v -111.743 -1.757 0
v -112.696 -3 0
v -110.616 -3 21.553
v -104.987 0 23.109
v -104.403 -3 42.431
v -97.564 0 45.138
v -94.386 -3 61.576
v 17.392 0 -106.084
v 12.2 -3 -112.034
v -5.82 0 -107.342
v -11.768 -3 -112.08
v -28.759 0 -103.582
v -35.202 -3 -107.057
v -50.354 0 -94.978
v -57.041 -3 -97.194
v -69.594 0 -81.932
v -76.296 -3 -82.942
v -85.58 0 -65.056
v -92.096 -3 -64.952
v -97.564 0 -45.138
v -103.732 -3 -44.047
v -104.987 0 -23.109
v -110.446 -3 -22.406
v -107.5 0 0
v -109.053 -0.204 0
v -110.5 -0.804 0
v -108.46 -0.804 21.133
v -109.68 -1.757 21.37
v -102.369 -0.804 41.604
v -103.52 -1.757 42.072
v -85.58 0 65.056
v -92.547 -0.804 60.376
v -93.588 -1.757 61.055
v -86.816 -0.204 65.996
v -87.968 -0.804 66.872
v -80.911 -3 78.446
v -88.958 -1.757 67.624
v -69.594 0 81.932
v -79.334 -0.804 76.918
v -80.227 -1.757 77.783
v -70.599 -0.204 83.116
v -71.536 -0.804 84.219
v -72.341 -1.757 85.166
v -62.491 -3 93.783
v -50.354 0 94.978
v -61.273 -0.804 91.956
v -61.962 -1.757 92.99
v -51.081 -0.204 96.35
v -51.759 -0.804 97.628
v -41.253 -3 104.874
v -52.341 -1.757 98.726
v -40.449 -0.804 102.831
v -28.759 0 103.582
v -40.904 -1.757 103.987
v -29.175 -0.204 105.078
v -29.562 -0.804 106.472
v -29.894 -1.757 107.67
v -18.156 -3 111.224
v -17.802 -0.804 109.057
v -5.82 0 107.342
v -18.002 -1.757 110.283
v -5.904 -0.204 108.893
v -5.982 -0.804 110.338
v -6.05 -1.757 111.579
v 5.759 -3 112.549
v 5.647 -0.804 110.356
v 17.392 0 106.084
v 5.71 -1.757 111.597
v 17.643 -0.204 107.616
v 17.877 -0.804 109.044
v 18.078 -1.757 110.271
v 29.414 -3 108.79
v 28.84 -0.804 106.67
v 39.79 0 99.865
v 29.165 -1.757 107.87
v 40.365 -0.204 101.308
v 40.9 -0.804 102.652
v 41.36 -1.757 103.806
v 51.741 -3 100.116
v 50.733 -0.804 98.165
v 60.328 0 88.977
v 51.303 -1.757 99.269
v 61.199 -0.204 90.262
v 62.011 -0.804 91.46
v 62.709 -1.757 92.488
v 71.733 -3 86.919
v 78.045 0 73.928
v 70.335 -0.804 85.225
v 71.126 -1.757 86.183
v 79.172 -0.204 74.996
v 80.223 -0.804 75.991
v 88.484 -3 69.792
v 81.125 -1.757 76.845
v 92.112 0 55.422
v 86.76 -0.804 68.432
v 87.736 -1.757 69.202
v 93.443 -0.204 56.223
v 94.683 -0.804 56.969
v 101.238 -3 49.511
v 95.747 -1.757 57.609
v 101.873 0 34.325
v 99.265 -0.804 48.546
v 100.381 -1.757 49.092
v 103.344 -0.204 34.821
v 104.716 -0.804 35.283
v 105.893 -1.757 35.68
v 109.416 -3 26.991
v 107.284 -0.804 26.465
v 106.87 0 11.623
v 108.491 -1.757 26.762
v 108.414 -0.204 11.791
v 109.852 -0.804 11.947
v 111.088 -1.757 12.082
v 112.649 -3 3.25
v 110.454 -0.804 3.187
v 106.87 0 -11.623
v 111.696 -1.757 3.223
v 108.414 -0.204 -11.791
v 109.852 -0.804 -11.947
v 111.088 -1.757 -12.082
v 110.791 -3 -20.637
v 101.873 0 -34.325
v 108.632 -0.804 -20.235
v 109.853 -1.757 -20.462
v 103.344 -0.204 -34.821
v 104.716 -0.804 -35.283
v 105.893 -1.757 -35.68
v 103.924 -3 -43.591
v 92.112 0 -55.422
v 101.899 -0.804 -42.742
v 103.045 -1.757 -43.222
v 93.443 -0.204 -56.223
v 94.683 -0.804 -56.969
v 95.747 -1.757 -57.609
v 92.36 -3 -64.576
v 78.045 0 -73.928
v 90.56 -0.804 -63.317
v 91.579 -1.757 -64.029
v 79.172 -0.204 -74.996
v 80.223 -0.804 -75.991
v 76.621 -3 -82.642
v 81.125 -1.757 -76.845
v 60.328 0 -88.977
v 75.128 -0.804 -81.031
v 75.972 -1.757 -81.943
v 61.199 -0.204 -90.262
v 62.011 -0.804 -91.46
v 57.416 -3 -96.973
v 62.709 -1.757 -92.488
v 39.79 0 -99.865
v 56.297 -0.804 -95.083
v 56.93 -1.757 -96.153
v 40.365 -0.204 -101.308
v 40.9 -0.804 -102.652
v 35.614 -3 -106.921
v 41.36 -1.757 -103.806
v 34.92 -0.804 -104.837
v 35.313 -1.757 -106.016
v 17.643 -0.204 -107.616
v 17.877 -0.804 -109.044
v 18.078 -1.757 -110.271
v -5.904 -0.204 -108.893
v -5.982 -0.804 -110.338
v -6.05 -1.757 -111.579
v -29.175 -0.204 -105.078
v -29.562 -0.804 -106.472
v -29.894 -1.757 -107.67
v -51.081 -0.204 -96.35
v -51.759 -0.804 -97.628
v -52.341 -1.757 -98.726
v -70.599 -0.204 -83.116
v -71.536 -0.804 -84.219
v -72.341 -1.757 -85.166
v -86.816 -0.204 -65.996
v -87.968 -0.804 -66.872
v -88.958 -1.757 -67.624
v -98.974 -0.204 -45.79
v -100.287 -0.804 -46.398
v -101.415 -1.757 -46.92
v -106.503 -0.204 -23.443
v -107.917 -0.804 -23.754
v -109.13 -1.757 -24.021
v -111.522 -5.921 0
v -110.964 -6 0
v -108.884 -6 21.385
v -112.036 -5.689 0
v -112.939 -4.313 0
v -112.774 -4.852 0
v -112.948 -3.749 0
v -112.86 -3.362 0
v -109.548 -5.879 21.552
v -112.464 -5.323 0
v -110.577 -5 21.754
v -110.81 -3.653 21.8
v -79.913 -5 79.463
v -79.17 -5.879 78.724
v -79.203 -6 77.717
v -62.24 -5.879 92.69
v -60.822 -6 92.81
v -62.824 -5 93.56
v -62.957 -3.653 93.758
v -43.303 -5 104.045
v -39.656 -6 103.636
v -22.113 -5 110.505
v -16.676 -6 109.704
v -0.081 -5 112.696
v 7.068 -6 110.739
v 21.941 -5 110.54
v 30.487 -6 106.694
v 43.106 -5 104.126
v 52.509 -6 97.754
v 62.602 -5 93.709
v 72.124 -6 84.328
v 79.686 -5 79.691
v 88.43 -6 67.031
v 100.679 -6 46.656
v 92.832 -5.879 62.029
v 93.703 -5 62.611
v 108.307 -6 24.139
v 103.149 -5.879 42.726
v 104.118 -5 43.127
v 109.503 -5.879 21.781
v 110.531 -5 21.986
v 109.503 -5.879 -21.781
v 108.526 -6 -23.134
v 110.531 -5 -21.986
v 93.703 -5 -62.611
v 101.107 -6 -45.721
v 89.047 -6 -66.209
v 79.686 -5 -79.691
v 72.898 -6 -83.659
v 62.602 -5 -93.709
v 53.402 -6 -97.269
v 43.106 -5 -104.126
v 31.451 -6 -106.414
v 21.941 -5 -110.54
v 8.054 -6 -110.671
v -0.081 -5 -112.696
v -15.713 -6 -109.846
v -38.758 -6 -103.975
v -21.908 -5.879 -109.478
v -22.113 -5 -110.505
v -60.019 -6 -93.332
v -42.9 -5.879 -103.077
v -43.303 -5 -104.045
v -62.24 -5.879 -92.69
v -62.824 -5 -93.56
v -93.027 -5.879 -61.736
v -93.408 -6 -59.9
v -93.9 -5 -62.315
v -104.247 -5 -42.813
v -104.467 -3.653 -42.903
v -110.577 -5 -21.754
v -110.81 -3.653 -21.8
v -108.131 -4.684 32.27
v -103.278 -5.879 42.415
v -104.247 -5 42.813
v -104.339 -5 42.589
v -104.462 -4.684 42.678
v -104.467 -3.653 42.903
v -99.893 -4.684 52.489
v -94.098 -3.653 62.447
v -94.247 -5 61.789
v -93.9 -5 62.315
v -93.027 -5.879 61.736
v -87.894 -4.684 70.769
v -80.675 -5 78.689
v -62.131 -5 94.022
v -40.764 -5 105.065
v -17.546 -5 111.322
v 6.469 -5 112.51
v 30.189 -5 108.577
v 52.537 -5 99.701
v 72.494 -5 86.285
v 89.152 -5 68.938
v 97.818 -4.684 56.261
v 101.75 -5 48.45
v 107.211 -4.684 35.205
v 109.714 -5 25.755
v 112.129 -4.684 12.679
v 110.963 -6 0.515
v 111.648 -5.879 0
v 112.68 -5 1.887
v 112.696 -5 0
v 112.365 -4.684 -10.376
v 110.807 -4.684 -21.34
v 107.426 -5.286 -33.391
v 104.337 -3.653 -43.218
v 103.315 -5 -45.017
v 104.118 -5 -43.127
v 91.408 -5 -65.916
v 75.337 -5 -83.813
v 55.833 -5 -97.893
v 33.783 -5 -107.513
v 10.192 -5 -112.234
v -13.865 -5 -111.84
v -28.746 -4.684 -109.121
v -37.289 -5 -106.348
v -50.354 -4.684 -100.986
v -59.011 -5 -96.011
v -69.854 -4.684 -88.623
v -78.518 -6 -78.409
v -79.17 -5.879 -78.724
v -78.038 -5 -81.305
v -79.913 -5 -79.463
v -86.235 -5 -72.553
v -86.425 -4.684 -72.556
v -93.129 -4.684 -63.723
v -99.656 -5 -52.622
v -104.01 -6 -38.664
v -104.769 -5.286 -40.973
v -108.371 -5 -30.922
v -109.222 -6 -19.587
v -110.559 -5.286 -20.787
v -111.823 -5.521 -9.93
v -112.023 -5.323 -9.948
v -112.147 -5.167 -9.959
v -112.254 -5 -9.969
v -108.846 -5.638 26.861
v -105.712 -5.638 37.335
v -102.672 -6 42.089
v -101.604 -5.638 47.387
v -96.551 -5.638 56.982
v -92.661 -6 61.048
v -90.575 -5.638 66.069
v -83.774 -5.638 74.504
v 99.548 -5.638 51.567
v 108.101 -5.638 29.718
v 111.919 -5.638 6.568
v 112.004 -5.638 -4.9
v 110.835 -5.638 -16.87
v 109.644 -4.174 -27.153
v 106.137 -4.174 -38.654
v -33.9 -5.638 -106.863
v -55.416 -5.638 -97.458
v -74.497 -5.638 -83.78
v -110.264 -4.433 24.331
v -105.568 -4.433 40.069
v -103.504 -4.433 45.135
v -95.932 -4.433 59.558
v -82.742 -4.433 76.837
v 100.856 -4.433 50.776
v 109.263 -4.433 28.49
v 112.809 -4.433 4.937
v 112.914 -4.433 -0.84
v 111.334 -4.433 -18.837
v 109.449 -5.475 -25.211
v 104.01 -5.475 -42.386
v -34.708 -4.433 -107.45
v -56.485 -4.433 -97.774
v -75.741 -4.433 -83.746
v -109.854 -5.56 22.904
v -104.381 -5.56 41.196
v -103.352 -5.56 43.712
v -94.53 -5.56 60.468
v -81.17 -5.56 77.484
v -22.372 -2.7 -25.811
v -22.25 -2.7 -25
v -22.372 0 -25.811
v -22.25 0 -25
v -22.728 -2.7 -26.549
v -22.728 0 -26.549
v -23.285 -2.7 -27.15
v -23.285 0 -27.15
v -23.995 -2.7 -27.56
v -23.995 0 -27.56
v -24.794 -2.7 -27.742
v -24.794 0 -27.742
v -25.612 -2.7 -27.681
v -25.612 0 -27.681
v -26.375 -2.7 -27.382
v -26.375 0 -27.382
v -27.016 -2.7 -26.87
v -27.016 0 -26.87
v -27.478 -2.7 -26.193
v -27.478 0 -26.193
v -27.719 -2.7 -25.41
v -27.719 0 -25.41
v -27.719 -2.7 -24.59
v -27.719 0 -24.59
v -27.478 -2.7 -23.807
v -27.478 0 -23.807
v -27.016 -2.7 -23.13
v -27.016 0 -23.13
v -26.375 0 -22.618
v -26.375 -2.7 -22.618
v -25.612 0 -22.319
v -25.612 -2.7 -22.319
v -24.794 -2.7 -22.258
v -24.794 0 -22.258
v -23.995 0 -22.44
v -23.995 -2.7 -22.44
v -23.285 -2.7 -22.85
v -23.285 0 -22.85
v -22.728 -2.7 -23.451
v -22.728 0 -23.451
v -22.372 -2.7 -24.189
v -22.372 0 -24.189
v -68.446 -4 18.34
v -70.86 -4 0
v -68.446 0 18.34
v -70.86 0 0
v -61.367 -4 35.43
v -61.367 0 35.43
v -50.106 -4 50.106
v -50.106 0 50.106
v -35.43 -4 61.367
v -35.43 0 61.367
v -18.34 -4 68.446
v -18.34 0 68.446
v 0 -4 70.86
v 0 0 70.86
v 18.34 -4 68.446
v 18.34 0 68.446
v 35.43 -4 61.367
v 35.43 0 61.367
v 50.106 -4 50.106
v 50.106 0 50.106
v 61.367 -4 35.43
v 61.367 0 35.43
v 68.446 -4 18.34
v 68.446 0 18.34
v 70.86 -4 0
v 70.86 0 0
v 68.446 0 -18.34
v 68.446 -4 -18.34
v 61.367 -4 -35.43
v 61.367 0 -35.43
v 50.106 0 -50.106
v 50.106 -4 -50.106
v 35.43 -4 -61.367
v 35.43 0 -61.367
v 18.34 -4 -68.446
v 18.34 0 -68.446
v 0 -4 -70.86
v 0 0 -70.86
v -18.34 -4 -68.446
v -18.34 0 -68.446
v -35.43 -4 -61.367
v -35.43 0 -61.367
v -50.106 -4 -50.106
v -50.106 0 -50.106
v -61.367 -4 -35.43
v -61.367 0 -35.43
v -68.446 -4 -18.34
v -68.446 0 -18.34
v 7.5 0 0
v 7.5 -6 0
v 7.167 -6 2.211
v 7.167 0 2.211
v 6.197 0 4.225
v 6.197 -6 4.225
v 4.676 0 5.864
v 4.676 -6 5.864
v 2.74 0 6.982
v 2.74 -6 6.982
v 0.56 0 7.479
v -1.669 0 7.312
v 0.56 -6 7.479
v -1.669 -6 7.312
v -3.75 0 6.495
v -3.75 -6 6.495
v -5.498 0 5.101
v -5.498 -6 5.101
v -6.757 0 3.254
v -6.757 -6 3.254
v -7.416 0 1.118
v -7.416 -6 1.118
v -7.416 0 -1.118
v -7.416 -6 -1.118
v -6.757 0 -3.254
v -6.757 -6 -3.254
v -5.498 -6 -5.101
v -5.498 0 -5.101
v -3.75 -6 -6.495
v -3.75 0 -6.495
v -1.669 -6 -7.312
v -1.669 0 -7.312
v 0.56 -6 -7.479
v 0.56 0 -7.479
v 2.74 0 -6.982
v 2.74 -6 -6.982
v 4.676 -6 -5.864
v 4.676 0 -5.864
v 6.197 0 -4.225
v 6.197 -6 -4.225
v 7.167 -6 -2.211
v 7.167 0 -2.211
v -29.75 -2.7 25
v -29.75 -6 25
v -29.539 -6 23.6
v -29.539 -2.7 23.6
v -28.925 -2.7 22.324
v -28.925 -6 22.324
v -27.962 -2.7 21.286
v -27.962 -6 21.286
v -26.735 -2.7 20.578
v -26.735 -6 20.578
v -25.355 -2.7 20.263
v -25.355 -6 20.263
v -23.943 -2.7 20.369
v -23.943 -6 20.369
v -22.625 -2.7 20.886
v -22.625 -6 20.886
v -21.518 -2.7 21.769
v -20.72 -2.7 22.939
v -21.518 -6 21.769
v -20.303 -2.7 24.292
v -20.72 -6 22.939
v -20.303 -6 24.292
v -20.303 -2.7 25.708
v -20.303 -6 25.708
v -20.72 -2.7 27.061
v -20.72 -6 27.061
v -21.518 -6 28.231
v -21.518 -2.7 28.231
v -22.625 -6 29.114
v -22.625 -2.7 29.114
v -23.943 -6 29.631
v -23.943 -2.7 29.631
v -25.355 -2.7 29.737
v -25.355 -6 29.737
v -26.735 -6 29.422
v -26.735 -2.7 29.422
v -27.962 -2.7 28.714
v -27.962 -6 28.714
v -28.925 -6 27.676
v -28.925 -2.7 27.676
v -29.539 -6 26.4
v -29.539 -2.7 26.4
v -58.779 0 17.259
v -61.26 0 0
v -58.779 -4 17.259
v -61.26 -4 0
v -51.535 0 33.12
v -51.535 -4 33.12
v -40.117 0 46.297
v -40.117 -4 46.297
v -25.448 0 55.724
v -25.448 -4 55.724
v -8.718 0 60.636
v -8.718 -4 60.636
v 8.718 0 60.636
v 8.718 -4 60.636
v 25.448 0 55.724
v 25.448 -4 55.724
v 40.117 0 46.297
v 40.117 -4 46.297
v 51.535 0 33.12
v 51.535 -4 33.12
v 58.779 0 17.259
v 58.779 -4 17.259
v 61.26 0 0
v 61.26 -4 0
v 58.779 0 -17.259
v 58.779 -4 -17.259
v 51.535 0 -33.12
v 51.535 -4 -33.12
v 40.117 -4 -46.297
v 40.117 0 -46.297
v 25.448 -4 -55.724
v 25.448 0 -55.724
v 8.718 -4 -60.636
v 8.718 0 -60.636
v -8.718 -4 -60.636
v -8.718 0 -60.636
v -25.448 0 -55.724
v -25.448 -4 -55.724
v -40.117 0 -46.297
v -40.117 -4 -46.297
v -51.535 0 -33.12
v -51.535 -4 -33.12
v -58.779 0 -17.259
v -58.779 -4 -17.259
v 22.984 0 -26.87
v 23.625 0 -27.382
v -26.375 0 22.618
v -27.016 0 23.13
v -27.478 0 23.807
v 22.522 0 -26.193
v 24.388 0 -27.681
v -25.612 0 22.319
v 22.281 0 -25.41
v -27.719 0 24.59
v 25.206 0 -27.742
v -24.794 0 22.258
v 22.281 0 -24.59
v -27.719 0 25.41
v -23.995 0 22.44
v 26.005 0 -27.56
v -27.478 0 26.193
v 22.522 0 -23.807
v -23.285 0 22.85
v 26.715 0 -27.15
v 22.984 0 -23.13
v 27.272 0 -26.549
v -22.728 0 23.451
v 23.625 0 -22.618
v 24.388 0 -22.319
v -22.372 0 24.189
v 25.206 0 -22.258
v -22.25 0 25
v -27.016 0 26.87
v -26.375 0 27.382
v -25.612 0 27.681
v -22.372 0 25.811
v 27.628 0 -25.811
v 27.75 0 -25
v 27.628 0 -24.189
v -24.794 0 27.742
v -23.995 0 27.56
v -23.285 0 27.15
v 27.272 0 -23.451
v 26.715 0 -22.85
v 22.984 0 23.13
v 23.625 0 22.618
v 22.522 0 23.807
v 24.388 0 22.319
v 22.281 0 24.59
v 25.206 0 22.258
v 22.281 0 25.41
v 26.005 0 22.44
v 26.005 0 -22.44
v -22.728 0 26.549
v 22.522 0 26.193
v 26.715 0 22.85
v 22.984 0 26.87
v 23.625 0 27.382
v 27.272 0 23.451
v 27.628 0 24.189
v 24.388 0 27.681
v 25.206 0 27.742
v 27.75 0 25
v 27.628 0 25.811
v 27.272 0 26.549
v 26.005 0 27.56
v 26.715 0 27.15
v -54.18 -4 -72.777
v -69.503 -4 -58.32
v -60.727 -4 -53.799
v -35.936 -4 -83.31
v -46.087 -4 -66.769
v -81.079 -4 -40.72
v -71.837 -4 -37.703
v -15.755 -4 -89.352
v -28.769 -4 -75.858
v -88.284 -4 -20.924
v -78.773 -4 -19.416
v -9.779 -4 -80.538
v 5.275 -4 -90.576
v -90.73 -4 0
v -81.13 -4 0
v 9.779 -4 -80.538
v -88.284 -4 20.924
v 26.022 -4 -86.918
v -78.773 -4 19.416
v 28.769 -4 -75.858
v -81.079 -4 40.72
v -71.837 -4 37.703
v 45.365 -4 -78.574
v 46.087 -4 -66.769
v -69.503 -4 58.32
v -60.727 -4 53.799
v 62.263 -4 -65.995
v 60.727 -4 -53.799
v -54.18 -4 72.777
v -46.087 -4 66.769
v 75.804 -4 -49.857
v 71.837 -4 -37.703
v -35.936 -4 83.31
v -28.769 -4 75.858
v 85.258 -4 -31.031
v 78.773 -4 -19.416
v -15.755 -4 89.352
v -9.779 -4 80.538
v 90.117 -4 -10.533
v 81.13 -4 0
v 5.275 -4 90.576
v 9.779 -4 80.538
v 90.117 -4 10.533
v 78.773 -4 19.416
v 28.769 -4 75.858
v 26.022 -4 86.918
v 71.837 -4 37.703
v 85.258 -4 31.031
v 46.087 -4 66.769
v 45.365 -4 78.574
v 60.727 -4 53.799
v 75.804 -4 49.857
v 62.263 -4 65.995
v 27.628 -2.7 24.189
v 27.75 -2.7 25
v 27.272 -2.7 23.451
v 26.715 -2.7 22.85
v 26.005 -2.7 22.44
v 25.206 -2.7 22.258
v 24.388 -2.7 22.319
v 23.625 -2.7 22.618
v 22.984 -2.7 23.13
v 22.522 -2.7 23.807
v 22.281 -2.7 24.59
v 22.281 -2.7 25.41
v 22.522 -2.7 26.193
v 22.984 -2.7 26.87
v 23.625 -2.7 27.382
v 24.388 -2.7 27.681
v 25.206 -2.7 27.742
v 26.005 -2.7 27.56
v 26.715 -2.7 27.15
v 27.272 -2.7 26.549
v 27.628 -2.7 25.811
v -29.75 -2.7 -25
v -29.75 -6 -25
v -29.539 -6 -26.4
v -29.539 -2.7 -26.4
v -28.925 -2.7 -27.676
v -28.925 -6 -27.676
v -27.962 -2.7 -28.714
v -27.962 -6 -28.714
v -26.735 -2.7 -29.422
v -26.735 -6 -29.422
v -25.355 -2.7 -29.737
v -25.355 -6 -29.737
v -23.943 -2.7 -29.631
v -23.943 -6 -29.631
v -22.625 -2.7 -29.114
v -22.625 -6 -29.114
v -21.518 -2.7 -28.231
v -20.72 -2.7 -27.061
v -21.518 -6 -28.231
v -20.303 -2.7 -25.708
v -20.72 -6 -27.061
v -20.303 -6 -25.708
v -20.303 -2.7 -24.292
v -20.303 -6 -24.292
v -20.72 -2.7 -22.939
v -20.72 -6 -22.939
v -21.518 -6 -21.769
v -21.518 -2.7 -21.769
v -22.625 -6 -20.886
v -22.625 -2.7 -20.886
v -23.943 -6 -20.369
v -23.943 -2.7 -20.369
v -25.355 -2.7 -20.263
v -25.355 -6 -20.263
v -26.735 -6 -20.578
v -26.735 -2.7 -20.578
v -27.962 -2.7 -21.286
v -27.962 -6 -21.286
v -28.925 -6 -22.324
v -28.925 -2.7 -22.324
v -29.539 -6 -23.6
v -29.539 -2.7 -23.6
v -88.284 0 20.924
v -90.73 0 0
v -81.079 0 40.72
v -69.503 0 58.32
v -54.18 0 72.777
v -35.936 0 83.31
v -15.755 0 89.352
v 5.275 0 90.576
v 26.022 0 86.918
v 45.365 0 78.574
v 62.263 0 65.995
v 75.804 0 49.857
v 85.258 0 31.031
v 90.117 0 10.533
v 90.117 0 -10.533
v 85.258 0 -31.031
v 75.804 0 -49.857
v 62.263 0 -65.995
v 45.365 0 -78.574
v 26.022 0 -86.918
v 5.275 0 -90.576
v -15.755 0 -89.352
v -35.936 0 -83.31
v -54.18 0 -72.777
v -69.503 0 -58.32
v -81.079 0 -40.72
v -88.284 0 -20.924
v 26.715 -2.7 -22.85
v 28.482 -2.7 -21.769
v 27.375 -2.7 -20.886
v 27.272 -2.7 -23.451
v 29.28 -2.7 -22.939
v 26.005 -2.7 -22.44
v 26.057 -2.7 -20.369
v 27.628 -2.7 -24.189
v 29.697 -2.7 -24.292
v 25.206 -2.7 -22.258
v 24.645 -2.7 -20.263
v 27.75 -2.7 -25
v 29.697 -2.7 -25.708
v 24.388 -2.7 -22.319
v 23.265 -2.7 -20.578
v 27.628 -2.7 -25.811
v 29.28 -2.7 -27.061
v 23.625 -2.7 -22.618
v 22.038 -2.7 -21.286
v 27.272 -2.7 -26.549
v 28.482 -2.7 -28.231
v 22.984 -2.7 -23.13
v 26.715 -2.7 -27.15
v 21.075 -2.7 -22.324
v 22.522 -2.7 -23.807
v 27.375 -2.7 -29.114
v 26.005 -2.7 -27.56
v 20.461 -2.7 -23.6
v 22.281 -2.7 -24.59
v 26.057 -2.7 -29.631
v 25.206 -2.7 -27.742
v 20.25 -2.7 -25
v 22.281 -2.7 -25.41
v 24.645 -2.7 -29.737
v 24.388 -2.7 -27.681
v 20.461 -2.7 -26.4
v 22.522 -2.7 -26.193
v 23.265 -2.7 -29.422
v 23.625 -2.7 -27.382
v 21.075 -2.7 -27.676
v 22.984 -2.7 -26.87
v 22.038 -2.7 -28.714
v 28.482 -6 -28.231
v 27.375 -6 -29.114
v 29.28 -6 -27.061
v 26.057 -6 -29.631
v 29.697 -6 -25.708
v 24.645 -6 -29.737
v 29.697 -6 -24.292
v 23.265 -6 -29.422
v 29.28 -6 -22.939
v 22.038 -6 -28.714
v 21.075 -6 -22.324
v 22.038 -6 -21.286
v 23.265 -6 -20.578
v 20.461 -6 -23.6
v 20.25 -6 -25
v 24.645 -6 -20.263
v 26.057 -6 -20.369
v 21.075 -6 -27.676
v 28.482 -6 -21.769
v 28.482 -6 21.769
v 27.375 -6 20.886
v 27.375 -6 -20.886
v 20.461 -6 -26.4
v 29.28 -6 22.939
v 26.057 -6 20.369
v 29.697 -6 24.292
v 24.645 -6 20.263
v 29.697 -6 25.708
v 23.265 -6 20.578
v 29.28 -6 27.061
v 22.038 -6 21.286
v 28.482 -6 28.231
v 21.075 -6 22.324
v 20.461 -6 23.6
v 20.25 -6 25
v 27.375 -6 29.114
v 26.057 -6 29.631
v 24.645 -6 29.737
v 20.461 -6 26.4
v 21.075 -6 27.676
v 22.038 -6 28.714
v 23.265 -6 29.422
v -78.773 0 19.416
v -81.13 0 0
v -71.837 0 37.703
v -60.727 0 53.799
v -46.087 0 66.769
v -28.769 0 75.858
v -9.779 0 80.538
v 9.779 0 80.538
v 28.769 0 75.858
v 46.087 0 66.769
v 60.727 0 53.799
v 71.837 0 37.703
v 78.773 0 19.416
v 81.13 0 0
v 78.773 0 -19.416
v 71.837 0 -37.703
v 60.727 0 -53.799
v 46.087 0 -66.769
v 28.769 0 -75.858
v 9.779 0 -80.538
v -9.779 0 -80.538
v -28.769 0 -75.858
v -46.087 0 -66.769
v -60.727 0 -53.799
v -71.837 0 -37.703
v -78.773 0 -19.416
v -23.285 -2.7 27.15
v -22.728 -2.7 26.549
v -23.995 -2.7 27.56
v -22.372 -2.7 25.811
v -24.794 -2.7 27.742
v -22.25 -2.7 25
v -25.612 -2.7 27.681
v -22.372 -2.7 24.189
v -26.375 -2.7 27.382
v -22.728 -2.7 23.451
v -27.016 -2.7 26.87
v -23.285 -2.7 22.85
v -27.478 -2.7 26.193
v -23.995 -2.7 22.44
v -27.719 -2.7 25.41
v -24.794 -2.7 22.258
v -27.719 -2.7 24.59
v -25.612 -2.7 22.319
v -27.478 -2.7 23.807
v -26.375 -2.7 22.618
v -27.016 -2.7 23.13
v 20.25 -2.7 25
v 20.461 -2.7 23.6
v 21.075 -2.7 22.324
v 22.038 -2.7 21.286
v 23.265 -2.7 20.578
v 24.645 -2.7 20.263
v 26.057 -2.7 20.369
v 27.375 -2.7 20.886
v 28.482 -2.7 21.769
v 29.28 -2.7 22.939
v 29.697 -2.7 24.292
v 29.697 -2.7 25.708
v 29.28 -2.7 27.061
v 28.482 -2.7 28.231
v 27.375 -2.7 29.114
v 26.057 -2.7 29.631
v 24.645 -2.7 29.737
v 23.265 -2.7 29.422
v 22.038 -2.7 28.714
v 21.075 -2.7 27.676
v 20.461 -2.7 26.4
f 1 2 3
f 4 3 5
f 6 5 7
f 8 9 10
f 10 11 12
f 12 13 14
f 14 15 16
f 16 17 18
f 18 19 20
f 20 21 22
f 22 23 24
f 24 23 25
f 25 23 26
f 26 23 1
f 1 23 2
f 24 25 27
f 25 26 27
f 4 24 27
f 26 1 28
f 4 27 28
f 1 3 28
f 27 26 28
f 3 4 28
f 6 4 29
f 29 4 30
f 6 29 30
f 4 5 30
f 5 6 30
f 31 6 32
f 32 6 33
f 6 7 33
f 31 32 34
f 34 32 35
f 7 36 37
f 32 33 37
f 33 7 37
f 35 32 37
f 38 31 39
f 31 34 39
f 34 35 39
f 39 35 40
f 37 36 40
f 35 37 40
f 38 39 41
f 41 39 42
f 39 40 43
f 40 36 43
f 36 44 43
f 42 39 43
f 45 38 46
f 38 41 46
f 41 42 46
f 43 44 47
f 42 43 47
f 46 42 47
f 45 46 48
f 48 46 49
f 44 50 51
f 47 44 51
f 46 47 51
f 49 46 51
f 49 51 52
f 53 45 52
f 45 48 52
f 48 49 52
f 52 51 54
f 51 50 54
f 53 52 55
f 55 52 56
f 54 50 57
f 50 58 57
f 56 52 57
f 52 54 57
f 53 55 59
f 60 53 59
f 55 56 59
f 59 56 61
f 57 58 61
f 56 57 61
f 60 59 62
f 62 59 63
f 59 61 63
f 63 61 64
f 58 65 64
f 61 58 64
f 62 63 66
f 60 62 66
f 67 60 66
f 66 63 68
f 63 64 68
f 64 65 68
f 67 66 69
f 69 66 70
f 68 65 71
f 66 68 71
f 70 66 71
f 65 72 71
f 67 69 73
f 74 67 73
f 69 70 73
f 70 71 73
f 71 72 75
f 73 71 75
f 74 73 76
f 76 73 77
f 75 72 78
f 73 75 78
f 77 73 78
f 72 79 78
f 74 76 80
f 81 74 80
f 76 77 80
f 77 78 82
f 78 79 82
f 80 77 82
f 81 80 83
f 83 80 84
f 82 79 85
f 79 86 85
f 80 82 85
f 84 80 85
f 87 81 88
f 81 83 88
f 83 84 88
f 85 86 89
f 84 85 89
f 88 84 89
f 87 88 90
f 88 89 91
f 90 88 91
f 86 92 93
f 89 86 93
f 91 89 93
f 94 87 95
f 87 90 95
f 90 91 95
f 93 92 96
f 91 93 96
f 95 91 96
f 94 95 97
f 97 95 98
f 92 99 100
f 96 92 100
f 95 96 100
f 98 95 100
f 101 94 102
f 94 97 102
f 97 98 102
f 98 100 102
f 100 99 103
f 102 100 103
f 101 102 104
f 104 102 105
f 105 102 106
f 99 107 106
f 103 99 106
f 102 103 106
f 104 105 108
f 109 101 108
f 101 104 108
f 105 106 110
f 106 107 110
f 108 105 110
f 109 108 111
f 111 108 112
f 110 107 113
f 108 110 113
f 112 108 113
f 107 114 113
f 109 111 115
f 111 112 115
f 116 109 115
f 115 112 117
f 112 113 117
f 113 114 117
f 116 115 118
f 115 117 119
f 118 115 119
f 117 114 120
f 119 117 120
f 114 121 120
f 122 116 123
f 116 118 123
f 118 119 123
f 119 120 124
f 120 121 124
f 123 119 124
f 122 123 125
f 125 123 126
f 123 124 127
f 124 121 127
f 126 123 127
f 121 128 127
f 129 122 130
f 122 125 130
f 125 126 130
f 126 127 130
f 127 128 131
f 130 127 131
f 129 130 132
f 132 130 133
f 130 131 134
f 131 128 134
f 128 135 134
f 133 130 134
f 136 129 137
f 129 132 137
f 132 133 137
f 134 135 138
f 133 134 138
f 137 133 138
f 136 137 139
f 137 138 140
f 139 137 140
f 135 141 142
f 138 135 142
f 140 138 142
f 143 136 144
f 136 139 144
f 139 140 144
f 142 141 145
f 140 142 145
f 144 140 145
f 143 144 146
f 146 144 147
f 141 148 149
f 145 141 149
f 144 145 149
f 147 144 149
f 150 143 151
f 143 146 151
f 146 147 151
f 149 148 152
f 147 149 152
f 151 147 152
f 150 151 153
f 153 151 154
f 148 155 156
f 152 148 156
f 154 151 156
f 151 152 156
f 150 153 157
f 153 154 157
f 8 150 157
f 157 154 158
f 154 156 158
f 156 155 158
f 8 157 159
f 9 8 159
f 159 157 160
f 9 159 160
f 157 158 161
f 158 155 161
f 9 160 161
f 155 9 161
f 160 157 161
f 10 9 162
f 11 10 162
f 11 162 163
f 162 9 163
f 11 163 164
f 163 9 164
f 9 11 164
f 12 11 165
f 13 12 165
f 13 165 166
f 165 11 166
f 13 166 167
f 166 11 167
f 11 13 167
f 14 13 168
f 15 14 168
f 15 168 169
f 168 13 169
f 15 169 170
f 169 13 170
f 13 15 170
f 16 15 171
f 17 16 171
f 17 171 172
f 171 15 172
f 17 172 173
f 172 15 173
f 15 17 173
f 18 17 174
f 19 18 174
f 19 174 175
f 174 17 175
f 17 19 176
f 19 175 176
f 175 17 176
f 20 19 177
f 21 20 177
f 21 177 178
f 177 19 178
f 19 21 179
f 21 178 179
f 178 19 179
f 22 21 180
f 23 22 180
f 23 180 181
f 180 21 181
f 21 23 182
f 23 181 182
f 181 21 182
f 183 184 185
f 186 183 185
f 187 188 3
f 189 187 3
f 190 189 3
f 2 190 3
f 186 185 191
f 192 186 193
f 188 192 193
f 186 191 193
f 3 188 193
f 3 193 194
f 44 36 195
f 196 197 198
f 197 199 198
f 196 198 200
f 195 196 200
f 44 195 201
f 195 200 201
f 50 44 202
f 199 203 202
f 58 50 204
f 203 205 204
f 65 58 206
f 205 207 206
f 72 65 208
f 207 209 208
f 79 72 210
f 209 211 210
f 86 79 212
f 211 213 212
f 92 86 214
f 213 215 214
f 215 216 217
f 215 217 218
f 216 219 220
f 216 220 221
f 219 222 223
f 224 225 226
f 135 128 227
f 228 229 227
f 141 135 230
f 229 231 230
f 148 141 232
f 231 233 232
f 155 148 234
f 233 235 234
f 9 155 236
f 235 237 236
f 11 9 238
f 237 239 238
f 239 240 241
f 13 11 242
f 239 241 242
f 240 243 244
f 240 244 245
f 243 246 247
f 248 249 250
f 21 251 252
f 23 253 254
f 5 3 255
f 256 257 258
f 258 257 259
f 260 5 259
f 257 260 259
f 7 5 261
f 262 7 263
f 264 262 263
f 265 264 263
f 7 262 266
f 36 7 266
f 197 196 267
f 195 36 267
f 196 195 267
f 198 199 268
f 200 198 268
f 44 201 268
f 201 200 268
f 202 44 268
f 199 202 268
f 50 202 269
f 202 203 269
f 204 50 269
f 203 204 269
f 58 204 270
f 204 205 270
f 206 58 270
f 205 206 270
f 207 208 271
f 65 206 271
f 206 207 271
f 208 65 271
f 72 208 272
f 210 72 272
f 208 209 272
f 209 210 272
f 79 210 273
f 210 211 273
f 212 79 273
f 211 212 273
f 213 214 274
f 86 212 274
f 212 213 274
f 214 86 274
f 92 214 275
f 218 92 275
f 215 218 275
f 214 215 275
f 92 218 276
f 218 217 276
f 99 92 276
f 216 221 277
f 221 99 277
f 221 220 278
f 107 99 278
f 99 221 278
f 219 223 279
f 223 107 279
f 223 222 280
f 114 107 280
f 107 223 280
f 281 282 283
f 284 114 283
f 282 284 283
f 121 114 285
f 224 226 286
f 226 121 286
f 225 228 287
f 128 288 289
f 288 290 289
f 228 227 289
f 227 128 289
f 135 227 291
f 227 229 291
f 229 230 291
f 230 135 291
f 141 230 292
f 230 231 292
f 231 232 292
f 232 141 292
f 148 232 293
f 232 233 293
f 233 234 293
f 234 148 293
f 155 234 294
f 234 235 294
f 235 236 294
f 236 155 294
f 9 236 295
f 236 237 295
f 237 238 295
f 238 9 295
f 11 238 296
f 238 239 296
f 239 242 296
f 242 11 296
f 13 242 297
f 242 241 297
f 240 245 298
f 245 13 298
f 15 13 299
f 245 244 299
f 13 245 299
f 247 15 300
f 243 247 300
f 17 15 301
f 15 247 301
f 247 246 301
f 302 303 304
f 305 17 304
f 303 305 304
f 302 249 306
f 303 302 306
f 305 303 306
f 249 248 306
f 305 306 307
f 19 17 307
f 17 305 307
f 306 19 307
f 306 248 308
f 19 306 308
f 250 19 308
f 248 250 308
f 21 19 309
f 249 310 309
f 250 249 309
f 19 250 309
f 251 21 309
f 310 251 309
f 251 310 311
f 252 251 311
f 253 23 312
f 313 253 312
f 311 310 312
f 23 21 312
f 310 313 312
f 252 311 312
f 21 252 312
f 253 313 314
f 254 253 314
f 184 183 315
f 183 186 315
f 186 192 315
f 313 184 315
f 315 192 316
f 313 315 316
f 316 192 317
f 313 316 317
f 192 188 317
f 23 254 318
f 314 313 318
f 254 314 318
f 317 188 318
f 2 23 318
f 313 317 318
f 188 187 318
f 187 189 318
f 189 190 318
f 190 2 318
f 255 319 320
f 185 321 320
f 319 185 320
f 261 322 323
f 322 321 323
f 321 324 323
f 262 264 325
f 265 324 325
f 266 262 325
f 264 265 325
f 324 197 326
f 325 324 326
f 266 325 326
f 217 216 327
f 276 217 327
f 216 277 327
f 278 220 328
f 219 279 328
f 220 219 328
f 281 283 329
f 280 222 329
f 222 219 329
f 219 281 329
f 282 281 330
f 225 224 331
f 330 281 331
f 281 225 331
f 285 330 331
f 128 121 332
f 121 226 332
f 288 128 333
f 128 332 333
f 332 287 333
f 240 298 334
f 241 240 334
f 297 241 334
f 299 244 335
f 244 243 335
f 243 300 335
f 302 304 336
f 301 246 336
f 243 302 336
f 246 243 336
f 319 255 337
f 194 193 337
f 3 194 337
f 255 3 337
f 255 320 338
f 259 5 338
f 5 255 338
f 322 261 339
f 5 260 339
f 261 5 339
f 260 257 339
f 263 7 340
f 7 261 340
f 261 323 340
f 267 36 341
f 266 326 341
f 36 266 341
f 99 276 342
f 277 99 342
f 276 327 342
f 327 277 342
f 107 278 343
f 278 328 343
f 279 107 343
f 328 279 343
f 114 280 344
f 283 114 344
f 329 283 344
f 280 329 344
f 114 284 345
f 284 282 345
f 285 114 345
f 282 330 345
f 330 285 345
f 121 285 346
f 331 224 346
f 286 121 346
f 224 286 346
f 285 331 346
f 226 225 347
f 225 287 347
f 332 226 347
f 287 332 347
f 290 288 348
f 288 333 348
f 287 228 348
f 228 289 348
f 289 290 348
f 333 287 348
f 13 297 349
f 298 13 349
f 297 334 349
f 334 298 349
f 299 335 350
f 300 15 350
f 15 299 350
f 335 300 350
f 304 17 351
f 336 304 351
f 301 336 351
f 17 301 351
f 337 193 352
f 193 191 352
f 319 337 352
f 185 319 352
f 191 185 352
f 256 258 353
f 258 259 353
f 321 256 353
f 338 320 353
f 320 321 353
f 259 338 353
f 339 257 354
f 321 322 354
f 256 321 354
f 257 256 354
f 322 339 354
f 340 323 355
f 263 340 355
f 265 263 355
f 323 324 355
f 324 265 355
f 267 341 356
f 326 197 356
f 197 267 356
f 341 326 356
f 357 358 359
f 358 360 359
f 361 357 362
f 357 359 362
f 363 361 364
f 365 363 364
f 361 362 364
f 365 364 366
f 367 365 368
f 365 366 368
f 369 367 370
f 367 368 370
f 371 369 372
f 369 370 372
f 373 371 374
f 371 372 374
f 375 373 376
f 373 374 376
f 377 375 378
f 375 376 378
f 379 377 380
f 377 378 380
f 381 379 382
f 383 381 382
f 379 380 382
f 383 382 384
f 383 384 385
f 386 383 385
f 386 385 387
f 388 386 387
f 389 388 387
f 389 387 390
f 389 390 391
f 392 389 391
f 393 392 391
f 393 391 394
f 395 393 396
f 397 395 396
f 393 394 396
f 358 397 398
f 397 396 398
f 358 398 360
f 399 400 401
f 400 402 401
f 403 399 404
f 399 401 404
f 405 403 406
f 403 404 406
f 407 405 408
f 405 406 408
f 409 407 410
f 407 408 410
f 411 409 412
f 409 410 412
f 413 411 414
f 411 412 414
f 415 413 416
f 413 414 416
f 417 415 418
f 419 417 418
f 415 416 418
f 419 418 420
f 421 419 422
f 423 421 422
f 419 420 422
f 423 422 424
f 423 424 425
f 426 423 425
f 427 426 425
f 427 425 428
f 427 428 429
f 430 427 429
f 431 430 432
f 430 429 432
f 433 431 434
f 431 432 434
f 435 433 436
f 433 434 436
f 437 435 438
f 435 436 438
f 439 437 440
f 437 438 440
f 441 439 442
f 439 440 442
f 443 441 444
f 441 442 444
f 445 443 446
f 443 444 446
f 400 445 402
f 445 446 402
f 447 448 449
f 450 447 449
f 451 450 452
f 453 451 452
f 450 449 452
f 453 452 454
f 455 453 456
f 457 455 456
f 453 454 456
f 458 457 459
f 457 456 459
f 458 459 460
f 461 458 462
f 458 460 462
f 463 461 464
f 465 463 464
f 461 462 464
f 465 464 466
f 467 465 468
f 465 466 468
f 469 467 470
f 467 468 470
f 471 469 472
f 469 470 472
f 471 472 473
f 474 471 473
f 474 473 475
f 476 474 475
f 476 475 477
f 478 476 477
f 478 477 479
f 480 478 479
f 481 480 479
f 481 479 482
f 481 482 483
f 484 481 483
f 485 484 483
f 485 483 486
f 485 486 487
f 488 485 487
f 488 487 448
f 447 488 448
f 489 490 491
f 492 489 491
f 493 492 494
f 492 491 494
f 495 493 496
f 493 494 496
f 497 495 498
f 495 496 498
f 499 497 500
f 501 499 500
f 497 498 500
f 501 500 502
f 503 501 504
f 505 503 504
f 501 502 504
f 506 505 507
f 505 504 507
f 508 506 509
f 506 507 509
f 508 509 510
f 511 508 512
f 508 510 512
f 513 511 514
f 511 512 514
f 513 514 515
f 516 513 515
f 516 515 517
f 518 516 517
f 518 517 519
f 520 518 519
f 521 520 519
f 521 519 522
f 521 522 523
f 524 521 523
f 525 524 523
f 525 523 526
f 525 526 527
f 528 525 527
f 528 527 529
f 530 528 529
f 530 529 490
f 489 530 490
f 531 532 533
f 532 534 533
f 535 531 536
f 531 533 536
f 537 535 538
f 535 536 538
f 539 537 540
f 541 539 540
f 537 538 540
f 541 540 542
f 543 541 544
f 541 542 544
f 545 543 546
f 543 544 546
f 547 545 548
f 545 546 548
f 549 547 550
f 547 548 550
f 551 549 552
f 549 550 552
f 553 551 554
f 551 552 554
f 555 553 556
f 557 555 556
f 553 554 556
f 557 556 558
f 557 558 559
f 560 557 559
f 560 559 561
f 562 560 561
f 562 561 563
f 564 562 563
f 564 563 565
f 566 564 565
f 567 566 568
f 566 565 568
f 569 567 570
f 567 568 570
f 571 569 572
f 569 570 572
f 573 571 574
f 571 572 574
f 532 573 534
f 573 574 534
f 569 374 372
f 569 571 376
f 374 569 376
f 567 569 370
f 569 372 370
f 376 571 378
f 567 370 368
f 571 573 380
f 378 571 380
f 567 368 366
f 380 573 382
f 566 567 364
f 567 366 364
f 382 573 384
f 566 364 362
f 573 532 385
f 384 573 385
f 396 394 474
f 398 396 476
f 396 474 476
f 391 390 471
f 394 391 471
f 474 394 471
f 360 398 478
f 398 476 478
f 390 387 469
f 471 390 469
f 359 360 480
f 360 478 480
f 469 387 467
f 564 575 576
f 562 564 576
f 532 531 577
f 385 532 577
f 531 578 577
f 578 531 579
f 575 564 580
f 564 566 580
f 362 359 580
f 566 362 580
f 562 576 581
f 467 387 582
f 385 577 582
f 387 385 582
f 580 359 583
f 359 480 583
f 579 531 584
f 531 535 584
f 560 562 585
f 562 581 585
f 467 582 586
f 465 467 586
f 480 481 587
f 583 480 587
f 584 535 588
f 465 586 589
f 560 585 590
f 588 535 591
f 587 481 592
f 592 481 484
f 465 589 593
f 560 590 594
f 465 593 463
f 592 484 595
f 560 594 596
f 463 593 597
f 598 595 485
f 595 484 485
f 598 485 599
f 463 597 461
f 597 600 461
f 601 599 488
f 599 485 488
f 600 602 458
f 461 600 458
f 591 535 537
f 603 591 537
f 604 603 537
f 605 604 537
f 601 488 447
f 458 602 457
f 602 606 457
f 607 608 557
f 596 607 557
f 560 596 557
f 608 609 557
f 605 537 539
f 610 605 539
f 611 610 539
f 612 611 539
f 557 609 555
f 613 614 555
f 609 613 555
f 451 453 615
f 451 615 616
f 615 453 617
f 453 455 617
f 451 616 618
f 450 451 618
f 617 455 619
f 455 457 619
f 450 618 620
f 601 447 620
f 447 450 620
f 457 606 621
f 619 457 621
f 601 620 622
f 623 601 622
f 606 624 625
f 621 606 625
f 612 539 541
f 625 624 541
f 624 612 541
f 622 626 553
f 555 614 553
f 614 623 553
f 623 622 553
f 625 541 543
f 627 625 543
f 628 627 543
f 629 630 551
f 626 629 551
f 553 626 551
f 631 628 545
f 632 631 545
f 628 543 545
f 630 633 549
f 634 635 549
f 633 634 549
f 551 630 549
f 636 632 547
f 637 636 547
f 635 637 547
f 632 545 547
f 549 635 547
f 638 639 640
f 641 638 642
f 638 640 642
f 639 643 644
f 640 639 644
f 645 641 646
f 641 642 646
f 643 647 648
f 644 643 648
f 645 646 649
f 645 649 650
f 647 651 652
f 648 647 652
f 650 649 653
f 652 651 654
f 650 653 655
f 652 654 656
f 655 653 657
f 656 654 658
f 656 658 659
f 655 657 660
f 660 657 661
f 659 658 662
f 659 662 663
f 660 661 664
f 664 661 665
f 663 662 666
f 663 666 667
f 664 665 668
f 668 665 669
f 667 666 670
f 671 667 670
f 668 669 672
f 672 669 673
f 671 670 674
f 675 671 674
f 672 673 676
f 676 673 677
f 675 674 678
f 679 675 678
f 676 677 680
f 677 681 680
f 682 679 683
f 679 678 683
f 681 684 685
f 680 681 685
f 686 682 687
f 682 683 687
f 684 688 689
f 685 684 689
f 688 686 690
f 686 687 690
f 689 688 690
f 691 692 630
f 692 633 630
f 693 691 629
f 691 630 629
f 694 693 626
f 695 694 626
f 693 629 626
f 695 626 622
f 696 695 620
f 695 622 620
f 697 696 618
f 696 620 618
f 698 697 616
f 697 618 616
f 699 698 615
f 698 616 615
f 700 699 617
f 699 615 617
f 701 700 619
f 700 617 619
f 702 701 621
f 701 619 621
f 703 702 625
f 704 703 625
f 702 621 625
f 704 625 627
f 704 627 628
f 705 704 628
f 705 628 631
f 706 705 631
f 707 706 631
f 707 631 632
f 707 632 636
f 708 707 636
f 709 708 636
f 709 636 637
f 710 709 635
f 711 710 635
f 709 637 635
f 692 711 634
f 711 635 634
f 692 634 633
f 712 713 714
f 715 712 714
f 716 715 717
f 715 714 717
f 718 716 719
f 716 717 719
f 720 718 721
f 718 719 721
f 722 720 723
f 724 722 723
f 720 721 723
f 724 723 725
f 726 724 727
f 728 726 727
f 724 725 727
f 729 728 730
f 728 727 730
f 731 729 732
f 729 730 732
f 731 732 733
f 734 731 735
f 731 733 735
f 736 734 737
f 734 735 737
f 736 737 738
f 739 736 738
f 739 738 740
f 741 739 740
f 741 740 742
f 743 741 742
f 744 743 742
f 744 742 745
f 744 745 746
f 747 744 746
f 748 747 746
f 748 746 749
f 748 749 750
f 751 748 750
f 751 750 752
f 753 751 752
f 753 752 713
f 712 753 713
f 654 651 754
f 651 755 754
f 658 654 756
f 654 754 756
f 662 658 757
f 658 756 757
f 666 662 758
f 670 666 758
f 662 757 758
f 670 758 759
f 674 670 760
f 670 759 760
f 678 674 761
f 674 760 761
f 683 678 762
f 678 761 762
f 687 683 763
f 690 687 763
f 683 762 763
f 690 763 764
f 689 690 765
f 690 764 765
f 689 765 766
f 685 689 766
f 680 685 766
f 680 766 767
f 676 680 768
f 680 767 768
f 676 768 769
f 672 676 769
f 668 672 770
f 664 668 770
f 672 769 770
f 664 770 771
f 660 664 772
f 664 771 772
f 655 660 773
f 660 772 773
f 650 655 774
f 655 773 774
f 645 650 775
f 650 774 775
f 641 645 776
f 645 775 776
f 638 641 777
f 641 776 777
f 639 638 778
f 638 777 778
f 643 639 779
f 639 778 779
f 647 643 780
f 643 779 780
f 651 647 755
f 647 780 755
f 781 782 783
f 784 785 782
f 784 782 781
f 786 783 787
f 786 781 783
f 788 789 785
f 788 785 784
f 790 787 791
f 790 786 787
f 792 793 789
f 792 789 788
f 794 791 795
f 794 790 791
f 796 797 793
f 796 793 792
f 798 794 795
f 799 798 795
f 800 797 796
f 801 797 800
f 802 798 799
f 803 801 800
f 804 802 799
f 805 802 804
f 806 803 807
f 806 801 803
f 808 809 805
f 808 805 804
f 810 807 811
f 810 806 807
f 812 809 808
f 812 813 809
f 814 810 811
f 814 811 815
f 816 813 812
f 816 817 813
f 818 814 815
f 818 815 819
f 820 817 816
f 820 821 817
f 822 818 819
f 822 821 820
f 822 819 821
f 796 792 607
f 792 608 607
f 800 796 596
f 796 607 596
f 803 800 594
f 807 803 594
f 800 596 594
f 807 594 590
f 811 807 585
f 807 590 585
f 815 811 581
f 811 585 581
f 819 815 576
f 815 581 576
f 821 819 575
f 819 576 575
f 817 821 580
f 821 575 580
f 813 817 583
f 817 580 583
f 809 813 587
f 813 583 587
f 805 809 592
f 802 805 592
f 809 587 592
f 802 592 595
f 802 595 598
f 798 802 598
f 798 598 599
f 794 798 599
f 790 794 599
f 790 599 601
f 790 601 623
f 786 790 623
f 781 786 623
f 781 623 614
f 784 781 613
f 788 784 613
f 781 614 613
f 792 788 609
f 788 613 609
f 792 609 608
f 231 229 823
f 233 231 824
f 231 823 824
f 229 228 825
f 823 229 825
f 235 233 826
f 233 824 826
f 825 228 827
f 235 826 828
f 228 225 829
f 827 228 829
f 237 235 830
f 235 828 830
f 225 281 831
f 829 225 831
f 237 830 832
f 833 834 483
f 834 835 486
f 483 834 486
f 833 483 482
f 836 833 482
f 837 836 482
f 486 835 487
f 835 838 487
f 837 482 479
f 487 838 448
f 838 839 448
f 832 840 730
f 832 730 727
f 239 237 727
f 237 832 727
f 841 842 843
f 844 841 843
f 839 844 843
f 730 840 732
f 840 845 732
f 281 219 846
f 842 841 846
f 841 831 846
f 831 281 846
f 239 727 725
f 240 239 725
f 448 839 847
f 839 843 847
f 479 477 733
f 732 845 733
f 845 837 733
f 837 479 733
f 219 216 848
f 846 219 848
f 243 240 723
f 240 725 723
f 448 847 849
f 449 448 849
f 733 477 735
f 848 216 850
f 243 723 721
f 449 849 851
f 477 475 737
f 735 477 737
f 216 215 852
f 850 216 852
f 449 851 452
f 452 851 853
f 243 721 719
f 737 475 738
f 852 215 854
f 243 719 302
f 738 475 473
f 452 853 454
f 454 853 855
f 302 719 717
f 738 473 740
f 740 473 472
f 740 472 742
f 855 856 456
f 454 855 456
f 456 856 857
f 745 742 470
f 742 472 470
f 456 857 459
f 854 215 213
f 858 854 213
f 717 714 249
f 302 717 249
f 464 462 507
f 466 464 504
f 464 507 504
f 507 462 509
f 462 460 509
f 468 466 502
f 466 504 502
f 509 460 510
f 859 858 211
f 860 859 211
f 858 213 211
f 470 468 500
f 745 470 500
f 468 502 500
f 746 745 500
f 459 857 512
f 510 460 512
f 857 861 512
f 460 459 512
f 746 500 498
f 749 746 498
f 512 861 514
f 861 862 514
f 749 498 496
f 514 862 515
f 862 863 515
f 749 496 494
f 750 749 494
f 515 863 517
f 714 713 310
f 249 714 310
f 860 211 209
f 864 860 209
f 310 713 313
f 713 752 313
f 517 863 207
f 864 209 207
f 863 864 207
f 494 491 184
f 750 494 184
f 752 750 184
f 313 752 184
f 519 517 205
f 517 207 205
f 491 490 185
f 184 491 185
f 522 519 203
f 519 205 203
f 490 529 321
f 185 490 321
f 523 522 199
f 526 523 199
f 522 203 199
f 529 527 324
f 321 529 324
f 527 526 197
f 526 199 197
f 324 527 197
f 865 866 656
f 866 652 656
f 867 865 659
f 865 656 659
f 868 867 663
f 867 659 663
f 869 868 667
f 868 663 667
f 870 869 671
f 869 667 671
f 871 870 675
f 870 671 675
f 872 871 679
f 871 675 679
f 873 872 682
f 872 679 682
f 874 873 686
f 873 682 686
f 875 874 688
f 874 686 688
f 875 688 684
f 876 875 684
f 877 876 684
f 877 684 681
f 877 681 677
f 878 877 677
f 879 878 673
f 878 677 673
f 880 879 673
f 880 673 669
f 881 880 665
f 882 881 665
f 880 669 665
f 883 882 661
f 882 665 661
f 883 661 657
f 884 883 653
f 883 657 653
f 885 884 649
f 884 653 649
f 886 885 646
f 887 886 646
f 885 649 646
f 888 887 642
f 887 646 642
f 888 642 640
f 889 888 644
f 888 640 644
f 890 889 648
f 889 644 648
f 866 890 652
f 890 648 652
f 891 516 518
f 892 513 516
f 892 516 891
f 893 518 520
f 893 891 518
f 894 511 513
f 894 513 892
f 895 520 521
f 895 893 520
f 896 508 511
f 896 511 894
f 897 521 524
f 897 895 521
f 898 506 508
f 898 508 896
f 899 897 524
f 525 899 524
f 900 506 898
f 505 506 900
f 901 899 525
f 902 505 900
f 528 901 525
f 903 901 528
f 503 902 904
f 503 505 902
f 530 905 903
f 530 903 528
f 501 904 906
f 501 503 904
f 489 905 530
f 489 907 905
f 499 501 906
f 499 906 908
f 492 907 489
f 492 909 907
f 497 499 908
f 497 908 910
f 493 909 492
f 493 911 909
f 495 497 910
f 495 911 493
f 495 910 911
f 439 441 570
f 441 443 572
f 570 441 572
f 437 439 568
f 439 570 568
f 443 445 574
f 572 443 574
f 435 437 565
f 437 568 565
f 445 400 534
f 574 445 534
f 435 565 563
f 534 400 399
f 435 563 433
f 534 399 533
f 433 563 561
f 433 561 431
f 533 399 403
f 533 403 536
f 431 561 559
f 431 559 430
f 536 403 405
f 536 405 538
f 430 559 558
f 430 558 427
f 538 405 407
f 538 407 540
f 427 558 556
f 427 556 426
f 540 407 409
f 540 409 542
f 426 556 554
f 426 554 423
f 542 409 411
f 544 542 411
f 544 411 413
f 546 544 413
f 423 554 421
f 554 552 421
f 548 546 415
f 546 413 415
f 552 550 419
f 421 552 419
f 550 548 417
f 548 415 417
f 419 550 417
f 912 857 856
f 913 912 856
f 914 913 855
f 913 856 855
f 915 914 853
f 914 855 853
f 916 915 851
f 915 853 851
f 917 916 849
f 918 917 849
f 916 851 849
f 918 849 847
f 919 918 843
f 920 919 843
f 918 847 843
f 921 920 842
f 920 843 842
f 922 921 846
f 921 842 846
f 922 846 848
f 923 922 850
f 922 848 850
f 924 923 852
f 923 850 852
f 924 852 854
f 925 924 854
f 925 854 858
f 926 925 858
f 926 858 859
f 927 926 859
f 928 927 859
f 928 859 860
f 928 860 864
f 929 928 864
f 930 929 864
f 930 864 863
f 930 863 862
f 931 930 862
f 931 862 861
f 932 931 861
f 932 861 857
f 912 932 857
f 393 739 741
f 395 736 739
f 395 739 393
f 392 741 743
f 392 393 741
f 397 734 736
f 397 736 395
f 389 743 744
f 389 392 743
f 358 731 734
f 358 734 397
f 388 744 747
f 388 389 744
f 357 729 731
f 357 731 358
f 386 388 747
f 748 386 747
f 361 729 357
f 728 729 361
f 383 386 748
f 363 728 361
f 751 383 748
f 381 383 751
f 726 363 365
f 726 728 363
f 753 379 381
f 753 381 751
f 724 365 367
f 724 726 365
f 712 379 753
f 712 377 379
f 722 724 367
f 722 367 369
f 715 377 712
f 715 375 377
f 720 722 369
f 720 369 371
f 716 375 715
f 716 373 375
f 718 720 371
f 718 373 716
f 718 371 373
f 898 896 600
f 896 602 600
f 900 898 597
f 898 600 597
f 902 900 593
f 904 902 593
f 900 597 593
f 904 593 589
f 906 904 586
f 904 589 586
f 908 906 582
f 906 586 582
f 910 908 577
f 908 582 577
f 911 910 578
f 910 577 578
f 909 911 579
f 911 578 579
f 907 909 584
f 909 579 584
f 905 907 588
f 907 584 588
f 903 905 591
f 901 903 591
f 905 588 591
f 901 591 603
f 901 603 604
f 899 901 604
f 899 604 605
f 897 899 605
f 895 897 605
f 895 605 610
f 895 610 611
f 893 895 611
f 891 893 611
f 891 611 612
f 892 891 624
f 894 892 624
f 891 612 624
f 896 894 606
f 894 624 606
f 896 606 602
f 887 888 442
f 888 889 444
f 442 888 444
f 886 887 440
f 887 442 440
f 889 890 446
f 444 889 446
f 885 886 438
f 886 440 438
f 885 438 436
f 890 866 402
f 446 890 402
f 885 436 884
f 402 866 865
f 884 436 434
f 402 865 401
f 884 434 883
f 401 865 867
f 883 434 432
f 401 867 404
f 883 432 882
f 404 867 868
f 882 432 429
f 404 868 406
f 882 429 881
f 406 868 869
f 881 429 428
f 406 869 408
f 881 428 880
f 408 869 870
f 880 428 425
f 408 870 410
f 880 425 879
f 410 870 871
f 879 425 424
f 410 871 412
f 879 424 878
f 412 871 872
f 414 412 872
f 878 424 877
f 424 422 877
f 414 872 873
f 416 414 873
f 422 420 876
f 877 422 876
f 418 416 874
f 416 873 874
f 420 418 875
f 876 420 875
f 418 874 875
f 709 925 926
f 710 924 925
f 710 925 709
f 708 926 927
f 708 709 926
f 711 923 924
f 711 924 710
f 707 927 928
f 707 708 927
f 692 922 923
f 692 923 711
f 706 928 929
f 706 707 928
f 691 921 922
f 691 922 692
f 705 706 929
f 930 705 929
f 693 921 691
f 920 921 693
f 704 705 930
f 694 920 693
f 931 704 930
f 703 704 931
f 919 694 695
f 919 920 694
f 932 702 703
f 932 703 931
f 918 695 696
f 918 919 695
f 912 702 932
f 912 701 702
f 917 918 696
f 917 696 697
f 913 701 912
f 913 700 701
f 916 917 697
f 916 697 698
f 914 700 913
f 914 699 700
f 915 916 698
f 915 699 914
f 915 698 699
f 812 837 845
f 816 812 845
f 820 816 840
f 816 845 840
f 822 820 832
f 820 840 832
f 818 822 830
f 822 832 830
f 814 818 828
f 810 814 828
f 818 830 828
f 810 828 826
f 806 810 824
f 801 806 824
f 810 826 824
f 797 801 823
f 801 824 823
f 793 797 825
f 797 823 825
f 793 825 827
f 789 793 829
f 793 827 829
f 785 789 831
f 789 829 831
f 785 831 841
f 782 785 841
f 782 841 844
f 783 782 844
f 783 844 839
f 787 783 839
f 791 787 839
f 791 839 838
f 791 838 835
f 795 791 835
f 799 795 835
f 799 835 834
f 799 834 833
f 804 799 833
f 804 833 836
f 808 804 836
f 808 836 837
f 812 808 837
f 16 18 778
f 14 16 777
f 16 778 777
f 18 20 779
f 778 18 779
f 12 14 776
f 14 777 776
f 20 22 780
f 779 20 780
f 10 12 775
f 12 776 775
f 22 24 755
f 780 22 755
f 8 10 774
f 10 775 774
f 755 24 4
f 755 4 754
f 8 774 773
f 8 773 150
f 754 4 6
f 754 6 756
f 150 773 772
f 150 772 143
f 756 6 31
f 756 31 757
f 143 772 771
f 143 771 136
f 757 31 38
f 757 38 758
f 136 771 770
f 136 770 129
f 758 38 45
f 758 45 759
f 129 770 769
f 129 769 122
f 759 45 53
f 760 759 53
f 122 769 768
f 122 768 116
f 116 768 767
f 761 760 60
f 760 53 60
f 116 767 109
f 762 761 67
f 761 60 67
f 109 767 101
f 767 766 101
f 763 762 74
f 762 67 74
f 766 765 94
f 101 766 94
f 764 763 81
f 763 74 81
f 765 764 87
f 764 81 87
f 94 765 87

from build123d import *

# Parameters (mm, degrees)
CBORE_FOR_M5_CHEESE_HEAD_SCREW1_D           = 5.5
CBORE_FOR_M5_CHEESE_HEAD_SCREW1_CBORE_D     = 9.5
CBORE_FOR_M5_CHEESE_HEAD_SCREW1_CBORE_DEPTH = 3.3
FILLET1_R                                   = 2
SKETCH6_R                                   = 7.5
CUT_EXTRUDE1_DEPTH                          = 7.0000001


with BuildPart() as part:
    # Sketch2 → Revolve1 (revolve)
    with BuildSketch(Plane.XY):
        with BuildLine():
            Line((0, 0), (-61.26, 0))
            Line((-61.26, 0), (-61.26, -4))
            Line((-61.26, -4), (-70.86, -4))
            Line((-70.86, -4), (-70.86, 0))
            Line((-70.86, 0), (-81.13, 0))
            Line((-81.13, 0), (-81.13, -4))
            Line((-81.13, -4), (-90.73, -4))
            Line((-90.73, -4), (-90.73, 0))
            Line((-90.73, 0), (-107.5, 0))
            ThreePointArc((-107.5, 0), (-111.742640687, -1.757359313), (-113.5, -6))
            Line((-113.5, -6), (0, -6))
            Line((0, -6), (0, 0))
        make_face()
    revolve(axis=Axis((0, -6, 0), (0, 1, 0)))

    # CBORE for M5 Cheese Head Screw1 (through all)
    with Locations(Plane(origin=(0, -6, 0), x_dir=(-1, 0, 0), z_dir=(0, -1, 0))):
        with Locations((25, -25), (-25, -25), (-25, 25), (25, 25)):
            CounterBoreHole(CBORE_FOR_M5_CHEESE_HEAD_SCREW1_D / 2, CBORE_FOR_M5_CHEESE_HEAD_SCREW1_CBORE_D / 2, CBORE_FOR_M5_CHEESE_HEAD_SCREW1_CBORE_DEPTH)

    # Fillet1
    fillet1_edges = [part.edges().sort_by_distance(p)[0] for p in [
        (113.5, -6, 0),
    ]]
    fillet(fillet1_edges, radius=FILLET1_R)

    # Sketch6 → Cut-Extrude1 (cut, through all)
    with BuildSketch(Plane.XZ.offset(6)):
        Circle(SKETCH6_R)
    extrude(amount=-CUT_EXTRUDE1_DEPTH, mode=Mode.SUBTRACT)


solid = part.part
